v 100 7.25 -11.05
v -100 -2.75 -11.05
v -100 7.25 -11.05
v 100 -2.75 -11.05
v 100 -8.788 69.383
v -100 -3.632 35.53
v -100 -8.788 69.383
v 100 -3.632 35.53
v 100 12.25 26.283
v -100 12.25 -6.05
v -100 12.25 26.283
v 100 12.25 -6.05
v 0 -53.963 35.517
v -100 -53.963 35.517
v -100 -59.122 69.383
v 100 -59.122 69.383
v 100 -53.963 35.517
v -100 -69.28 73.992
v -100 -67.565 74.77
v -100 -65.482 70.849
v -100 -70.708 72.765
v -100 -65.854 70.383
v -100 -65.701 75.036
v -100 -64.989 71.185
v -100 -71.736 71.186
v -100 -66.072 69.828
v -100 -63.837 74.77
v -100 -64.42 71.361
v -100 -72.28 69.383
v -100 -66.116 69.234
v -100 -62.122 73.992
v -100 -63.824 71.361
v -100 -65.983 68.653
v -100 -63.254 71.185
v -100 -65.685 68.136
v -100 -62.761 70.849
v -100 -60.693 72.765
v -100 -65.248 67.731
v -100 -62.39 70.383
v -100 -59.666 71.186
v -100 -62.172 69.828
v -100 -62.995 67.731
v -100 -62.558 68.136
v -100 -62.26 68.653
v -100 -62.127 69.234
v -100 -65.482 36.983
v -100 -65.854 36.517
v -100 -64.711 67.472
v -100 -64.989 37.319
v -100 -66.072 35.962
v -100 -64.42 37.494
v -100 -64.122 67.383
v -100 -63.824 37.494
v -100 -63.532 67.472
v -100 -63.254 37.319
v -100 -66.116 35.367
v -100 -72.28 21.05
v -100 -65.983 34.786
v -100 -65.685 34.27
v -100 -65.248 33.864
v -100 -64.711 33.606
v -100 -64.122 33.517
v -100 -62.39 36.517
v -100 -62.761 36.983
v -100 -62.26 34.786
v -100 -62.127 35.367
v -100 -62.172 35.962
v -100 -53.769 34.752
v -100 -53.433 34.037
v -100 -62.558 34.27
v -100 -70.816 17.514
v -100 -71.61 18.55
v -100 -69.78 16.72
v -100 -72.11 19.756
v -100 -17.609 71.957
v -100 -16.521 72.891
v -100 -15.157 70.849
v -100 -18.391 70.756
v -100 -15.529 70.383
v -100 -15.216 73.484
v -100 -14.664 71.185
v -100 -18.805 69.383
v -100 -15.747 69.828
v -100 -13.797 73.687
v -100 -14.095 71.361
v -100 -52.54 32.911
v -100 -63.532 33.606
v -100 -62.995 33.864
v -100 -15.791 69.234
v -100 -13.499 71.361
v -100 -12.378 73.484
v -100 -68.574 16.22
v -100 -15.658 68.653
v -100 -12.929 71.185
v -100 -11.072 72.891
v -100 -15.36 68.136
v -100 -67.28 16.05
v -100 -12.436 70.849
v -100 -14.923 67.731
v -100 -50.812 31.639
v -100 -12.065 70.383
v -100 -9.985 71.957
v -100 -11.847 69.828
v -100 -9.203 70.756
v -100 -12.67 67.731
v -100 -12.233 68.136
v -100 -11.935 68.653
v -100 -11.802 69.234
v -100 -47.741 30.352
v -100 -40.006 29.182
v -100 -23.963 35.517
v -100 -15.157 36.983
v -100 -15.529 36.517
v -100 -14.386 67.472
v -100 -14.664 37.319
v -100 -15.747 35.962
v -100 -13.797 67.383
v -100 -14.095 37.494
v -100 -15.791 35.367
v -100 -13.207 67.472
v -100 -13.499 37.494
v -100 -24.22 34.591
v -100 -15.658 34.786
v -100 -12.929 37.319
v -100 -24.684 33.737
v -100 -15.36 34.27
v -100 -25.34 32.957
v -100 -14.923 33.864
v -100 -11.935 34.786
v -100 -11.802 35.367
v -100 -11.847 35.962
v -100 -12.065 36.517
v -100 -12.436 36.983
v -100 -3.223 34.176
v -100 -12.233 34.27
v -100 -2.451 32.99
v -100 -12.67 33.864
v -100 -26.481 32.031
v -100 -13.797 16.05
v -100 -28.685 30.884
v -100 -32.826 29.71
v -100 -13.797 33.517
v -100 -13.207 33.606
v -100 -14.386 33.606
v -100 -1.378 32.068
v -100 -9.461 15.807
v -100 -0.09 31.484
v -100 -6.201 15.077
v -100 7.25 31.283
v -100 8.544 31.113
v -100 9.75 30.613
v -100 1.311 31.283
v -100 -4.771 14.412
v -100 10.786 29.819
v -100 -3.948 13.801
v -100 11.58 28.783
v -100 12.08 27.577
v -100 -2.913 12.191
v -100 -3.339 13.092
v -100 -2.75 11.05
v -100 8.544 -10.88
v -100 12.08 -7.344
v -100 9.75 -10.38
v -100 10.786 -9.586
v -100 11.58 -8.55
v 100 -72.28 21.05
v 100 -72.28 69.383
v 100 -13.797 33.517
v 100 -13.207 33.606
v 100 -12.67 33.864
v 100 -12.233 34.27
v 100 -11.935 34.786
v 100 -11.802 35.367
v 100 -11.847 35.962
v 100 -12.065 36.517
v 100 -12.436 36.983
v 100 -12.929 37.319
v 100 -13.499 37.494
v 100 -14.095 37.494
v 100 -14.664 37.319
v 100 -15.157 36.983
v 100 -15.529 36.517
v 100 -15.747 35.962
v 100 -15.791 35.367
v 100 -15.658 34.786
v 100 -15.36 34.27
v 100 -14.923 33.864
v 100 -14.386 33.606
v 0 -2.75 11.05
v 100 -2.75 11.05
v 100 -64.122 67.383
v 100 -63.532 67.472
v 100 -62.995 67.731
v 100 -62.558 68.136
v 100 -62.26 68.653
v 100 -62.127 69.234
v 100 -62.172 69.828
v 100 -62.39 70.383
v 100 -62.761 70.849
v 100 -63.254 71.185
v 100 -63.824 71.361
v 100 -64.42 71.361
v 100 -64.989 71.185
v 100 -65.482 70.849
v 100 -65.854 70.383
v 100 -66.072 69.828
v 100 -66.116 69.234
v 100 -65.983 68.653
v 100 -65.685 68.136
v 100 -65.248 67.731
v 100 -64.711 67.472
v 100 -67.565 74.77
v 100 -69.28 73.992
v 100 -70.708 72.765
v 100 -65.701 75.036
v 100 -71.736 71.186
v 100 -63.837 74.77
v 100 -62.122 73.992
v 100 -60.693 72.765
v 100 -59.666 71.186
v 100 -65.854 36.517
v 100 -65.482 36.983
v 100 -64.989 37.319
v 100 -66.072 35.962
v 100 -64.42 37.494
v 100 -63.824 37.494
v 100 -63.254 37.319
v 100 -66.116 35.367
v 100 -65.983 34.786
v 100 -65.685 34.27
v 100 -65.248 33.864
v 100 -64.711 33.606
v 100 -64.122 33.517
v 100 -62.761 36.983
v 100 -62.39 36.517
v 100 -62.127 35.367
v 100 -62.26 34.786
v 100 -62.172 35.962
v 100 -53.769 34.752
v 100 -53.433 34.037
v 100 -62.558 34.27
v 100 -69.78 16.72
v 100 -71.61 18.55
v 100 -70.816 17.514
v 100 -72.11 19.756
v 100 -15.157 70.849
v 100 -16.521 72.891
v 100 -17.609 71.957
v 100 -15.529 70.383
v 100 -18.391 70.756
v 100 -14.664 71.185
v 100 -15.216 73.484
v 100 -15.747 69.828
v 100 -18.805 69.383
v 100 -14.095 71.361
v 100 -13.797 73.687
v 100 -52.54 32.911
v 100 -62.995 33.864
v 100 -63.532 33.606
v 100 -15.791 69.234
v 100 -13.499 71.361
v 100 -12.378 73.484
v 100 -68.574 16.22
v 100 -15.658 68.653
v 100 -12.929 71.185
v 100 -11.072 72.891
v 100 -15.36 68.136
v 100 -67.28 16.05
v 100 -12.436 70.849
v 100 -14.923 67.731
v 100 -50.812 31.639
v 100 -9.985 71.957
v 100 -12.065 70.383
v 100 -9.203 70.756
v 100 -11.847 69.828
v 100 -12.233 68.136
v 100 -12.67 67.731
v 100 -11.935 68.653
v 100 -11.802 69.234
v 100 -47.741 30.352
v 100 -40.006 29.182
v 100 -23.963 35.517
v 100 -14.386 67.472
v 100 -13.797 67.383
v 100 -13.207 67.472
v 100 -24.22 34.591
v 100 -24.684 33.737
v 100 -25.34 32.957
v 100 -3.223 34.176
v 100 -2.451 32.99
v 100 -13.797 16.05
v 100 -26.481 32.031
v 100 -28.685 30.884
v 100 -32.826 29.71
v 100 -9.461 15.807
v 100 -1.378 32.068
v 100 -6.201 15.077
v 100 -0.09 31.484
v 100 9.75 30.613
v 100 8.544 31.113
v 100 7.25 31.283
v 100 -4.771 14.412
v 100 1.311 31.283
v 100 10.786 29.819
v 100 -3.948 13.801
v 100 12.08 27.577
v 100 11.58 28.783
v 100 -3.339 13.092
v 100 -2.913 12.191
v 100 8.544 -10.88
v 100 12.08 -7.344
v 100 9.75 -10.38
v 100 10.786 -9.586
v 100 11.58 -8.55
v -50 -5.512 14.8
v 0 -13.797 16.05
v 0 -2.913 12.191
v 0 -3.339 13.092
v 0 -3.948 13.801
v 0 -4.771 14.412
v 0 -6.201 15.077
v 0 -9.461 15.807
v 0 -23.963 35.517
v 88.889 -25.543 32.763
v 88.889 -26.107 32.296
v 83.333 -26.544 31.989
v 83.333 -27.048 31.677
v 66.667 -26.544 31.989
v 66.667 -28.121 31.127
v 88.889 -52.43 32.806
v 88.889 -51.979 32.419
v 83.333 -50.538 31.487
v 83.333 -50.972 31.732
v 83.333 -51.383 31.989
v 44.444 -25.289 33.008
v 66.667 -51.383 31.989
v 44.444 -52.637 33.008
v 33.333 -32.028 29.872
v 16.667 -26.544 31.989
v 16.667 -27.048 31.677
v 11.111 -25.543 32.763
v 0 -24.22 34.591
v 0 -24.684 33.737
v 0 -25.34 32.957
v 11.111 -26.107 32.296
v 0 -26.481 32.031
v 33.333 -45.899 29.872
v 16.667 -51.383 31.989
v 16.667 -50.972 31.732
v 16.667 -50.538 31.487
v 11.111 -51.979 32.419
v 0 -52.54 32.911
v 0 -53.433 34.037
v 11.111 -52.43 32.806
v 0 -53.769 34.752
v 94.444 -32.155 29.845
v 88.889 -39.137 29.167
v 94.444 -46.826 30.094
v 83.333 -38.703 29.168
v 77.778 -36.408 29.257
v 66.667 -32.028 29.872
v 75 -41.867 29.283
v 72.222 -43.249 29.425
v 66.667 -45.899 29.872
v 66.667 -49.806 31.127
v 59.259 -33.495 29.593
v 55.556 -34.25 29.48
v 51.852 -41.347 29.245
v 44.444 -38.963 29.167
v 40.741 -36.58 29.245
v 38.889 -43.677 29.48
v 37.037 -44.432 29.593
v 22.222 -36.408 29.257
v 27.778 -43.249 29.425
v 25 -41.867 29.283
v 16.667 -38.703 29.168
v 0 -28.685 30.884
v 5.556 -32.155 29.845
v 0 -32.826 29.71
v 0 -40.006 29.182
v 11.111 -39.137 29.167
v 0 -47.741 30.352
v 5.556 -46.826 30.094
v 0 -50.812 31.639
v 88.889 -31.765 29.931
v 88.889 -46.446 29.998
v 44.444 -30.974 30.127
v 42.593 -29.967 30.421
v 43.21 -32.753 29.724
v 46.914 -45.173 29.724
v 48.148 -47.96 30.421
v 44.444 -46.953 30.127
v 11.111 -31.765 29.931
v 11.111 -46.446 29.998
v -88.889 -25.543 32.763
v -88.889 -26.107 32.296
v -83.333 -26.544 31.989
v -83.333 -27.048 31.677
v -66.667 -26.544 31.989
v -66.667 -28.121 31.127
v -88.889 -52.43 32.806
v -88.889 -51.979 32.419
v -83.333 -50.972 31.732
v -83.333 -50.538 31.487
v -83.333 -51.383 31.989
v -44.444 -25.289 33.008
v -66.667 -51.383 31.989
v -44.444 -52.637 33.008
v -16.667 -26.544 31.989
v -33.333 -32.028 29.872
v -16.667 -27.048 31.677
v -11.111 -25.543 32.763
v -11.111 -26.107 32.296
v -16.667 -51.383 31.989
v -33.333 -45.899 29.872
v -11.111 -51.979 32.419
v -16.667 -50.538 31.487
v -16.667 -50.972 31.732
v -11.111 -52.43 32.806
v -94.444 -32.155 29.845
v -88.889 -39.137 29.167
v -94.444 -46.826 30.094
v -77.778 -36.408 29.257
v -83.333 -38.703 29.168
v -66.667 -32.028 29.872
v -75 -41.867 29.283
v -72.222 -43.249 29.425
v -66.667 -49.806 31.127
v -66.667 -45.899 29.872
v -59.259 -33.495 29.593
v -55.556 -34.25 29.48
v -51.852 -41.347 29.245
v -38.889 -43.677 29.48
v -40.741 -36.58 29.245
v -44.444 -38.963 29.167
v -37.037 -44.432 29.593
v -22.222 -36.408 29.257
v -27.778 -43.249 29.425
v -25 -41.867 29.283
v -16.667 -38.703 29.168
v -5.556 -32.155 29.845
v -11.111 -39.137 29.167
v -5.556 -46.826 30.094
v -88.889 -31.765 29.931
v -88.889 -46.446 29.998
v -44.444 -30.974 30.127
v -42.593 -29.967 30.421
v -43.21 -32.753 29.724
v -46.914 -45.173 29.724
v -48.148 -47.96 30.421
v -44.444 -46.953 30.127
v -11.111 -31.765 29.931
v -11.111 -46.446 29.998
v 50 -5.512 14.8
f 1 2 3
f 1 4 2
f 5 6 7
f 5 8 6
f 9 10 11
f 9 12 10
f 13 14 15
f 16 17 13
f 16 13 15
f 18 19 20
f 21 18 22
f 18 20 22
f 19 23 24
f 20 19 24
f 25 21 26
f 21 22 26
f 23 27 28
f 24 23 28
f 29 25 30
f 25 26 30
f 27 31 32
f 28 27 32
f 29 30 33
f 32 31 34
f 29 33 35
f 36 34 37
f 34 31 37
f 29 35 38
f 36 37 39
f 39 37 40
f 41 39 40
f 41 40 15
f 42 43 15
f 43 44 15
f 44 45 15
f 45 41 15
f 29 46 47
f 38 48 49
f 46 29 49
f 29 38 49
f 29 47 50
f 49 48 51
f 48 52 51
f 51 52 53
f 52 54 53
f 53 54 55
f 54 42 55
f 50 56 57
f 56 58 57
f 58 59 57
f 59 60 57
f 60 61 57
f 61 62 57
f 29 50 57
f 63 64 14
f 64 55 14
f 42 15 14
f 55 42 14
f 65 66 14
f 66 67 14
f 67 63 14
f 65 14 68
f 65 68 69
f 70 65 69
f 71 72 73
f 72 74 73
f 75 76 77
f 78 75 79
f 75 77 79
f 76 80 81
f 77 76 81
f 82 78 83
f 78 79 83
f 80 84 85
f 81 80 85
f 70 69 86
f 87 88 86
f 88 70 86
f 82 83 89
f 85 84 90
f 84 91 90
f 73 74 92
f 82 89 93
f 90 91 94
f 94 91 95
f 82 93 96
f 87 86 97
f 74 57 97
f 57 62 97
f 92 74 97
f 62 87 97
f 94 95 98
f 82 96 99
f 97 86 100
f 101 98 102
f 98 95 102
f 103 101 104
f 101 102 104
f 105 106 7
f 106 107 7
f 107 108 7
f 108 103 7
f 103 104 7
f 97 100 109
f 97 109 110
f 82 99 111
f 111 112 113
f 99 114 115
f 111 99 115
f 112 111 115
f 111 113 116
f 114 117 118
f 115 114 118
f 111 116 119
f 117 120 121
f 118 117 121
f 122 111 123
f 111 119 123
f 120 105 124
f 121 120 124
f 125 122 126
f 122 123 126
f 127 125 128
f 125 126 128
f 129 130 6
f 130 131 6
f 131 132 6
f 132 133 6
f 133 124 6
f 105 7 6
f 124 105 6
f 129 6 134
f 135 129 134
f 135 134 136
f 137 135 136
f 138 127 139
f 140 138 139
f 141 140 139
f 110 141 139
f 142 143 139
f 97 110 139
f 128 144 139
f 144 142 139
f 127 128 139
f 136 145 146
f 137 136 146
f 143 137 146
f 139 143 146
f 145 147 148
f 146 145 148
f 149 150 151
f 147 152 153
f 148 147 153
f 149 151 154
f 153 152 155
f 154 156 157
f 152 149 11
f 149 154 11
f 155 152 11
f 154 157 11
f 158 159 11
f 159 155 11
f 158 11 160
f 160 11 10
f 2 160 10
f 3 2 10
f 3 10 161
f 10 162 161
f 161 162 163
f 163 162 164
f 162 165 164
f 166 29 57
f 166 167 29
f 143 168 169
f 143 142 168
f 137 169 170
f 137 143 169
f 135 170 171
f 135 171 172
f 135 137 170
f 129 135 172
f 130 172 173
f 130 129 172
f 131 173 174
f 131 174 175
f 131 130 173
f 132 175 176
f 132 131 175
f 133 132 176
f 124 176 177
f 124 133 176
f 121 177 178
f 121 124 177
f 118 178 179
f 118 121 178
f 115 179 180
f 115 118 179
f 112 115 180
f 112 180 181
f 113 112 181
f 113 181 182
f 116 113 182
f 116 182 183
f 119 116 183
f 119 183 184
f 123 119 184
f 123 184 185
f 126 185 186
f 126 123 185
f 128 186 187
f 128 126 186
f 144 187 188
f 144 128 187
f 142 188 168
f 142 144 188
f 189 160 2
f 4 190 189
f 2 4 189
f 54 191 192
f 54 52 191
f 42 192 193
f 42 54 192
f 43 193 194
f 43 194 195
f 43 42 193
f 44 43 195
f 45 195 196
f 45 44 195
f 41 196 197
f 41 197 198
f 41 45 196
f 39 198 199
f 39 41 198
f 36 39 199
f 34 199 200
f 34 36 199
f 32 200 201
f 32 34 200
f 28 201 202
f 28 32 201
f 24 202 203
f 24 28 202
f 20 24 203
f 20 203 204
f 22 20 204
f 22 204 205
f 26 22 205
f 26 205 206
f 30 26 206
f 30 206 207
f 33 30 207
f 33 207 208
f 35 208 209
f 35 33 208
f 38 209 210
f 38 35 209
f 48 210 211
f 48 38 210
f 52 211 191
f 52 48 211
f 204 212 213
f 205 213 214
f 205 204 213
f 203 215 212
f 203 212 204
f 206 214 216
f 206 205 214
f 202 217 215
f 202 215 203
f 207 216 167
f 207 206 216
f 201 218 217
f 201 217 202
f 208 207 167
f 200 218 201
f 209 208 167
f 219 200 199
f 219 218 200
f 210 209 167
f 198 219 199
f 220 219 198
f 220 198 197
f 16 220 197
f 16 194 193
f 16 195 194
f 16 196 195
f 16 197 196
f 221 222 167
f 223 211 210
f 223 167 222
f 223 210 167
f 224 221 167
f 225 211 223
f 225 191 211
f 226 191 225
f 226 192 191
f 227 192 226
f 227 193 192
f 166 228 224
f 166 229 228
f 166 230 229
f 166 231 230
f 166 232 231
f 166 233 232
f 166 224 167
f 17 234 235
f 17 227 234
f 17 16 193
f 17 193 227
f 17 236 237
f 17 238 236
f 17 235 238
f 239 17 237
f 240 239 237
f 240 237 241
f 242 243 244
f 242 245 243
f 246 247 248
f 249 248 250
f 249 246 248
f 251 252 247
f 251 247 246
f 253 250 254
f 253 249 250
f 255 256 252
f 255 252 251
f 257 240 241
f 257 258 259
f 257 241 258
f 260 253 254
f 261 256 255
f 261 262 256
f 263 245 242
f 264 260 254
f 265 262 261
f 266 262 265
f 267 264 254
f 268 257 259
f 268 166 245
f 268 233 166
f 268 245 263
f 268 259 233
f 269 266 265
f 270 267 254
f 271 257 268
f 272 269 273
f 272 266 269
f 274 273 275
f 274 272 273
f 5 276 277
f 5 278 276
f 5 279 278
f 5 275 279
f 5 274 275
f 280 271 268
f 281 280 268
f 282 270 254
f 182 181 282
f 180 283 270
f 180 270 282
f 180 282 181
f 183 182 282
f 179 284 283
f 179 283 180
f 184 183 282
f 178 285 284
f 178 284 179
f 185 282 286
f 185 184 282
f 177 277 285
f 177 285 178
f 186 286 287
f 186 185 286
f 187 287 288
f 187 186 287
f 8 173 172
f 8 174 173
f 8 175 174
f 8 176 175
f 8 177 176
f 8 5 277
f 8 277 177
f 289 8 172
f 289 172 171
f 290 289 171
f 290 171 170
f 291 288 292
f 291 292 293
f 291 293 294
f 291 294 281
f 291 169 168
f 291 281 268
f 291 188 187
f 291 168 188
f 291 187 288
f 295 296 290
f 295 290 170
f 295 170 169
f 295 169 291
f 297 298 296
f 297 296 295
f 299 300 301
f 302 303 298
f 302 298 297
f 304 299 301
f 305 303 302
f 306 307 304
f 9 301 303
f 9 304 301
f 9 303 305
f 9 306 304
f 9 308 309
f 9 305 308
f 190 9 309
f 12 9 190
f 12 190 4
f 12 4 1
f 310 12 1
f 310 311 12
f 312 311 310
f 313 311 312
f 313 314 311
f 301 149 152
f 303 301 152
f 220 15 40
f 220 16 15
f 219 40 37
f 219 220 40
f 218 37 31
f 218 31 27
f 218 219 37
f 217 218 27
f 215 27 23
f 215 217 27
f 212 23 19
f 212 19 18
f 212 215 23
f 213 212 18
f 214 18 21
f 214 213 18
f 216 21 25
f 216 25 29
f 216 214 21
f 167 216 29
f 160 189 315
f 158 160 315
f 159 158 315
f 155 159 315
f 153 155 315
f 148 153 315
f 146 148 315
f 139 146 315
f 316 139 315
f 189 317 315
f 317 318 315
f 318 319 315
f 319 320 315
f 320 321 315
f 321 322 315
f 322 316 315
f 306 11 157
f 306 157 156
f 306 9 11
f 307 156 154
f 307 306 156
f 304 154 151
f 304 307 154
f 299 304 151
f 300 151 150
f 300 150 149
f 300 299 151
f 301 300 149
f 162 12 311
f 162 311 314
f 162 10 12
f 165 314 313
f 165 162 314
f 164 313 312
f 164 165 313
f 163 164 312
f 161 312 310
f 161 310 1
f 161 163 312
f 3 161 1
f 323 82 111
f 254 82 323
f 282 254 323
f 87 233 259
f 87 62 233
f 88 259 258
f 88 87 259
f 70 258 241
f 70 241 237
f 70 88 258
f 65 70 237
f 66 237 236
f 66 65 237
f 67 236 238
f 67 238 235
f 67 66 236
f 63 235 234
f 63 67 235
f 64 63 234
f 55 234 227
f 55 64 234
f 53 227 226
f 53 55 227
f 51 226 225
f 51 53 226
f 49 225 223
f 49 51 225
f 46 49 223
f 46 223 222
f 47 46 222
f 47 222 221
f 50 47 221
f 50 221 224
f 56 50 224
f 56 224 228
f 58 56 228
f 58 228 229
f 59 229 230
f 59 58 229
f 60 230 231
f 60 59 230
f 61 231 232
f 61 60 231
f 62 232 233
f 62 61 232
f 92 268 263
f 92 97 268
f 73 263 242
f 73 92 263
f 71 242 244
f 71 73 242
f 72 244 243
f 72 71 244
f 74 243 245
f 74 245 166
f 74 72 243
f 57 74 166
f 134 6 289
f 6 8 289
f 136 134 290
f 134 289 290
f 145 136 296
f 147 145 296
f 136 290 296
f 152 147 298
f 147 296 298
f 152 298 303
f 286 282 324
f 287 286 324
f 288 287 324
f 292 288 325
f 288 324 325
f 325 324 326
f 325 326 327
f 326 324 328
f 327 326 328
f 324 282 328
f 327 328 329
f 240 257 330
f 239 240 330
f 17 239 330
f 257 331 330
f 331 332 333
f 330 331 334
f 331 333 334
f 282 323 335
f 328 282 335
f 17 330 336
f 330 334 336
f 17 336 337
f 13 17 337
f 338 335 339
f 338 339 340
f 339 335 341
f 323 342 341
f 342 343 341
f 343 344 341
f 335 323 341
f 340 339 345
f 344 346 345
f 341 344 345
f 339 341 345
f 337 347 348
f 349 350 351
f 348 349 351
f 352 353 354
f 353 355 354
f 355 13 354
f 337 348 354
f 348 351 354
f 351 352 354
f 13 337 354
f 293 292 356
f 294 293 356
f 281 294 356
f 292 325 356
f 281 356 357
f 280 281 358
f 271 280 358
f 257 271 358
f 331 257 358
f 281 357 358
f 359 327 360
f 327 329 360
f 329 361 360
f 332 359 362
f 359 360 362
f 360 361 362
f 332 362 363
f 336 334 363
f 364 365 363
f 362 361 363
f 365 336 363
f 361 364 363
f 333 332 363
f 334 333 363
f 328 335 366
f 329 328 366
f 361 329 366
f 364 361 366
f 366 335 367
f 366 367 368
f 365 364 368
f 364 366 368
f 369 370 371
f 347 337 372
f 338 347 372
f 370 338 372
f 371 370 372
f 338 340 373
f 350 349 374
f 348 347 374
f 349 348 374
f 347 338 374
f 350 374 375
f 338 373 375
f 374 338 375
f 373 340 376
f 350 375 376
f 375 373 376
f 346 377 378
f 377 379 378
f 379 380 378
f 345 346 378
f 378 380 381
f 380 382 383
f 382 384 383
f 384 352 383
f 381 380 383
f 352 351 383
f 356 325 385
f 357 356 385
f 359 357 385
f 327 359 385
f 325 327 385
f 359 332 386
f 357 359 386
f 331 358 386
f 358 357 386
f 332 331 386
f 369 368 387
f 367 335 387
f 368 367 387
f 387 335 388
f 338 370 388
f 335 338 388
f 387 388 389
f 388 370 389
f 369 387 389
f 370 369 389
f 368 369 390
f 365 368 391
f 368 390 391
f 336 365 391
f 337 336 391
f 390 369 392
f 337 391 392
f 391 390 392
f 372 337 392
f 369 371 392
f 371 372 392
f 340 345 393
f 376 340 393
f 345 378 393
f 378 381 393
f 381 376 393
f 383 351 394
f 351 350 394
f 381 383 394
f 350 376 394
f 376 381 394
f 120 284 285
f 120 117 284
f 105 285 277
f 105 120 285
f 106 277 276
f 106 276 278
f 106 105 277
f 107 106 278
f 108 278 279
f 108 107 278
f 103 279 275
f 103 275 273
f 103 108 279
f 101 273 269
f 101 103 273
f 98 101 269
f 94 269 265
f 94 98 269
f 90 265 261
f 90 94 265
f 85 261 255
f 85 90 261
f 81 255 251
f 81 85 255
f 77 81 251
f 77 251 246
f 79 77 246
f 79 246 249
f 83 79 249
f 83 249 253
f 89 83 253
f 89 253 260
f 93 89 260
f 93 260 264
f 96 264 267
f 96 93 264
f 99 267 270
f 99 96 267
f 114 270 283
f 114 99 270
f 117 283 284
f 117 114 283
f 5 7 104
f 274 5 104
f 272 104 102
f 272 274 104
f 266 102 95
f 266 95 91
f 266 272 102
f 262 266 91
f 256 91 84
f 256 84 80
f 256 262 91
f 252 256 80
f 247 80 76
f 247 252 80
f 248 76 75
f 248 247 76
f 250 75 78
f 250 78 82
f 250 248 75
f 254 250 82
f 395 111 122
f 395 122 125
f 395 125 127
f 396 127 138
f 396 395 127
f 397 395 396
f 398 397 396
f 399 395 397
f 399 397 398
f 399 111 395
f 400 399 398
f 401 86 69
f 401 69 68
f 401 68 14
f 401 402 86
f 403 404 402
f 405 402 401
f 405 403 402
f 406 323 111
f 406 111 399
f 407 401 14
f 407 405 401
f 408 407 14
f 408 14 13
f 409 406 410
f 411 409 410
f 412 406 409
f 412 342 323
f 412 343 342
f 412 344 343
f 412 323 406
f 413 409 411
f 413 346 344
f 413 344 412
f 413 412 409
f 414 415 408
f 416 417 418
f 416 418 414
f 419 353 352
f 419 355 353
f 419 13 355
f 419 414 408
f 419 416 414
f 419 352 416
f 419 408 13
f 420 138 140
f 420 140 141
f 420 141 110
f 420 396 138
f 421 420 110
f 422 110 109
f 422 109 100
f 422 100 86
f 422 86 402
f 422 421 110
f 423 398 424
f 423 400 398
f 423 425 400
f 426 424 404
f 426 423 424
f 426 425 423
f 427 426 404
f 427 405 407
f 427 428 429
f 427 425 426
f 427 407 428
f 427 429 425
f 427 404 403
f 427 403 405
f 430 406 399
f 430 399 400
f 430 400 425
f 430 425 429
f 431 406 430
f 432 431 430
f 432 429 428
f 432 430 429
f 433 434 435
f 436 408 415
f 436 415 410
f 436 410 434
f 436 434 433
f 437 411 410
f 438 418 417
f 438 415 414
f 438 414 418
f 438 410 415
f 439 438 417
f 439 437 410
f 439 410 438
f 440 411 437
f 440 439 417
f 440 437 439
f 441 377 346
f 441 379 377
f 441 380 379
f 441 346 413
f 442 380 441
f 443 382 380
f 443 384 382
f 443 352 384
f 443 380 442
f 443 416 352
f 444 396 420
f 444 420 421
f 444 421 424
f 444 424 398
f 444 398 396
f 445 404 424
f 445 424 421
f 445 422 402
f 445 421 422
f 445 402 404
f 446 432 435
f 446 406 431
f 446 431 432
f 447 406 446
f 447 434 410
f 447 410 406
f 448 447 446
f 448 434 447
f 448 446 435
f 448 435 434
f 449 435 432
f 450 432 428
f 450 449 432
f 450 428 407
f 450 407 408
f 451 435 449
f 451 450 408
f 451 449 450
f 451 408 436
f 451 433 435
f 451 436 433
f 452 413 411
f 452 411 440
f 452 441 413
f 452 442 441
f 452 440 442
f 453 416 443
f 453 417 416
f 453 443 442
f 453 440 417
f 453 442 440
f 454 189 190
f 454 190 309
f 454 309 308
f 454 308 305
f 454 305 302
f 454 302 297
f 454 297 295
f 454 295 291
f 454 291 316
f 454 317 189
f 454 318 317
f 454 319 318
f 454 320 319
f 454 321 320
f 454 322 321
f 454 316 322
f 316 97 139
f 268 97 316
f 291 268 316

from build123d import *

# Parameters (mm, degrees)
SKETCH2_R           = 2
BOSS_EXTRUDE1_DEPTH = 100
FILLET1_R           = 5


with BuildPart() as part:
    # Sketch2 → Boss-Extrude1 (new body, symmetric)
    with BuildSketch(Plane(origin=(0, 0, 0), x_dir=(0, 0, -1), z_dir=(1, 0, 0))):
        with BuildLine():
            Line((11.05, 12.25), (-11.05, 12.25))
            Line((-11.05, 12.25), (-31.283333333, 12.25))
            Line((-31.283333333, 12.25), (-31.283333333, -2.985208333))
            Line((-31.283333333, -2.985208333), (-69.383333333, -8.788333333))
            ThreePointArc((-69.383333333, -8.788333333), (-73.686594127, -13.796666667), (-69.383333333, -18.805))
            Line((-69.383333333, -18.805), (-35.516666667, -23.963333333))
            add(Edge.make_bspline(
                [(-35.516666667, -23.963333333), (-27.05, -25.252916667), (-27.05, -52.67375), (-35.516666667, -53.963333333)],
                knots=[0, 0, 0, 0, 1, 1, 1, 1], degree=3))
            Line((-35.516666667, -53.963333333), (-69.383333333, -59.121666667))
            ThreePointArc((-69.383333333, -59.121666667), (-75.036285741, -65.700833333), (-69.383333333, -72.28))
            Line((-69.383333333, -72.28), (-31.283333333, -72.28))
            Line((-31.283333333, -72.28), (-16.05, -72.28))
            Line((-16.05, -72.28), (-16.05, -13.796666667))
            add(Edge.make_bspline(
                [(-11.05, -2.75), (-16.05, -2.75), (-16.05, -13.796666667)],
                knots=[0, 0, 0, 1, 1, 1], degree=2))
            Line((-11.05, -2.75), (11.05, -2.75))
            Line((11.05, -2.75), (11.05, 12.25))
        make_face()
        with Locations((-35.516666667, -13.796666667)):
            Circle(SKETCH2_R, mode=Mode.SUBTRACT)
        with Locations((-69.383333333, -13.796666667)):
            Circle(SKETCH2_R, mode=Mode.SUBTRACT)
        with Locations((-35.516666667, -64.121666667)):
            Circle(SKETCH2_R, mode=Mode.SUBTRACT)
        with Locations((-69.383333333, -64.121666667)):
            Circle(SKETCH2_R, mode=Mode.SUBTRACT)
    extrude(amount=BOSS_EXTRUDE1_DEPTH, both=True)

    # Fillet1
    fillet1_edges = [part.edges().sort_by_distance(p)[0] for p in [
        (0, -72.28, 16.05),
        (0, -2.985208333, 31.283333333),
        (0, 12.25, 31.283333333),
        (0, 12.25, -11.05),
    ]]
    fillet(fillet1_edges, radius=FILLET1_R)


solid = part.part
